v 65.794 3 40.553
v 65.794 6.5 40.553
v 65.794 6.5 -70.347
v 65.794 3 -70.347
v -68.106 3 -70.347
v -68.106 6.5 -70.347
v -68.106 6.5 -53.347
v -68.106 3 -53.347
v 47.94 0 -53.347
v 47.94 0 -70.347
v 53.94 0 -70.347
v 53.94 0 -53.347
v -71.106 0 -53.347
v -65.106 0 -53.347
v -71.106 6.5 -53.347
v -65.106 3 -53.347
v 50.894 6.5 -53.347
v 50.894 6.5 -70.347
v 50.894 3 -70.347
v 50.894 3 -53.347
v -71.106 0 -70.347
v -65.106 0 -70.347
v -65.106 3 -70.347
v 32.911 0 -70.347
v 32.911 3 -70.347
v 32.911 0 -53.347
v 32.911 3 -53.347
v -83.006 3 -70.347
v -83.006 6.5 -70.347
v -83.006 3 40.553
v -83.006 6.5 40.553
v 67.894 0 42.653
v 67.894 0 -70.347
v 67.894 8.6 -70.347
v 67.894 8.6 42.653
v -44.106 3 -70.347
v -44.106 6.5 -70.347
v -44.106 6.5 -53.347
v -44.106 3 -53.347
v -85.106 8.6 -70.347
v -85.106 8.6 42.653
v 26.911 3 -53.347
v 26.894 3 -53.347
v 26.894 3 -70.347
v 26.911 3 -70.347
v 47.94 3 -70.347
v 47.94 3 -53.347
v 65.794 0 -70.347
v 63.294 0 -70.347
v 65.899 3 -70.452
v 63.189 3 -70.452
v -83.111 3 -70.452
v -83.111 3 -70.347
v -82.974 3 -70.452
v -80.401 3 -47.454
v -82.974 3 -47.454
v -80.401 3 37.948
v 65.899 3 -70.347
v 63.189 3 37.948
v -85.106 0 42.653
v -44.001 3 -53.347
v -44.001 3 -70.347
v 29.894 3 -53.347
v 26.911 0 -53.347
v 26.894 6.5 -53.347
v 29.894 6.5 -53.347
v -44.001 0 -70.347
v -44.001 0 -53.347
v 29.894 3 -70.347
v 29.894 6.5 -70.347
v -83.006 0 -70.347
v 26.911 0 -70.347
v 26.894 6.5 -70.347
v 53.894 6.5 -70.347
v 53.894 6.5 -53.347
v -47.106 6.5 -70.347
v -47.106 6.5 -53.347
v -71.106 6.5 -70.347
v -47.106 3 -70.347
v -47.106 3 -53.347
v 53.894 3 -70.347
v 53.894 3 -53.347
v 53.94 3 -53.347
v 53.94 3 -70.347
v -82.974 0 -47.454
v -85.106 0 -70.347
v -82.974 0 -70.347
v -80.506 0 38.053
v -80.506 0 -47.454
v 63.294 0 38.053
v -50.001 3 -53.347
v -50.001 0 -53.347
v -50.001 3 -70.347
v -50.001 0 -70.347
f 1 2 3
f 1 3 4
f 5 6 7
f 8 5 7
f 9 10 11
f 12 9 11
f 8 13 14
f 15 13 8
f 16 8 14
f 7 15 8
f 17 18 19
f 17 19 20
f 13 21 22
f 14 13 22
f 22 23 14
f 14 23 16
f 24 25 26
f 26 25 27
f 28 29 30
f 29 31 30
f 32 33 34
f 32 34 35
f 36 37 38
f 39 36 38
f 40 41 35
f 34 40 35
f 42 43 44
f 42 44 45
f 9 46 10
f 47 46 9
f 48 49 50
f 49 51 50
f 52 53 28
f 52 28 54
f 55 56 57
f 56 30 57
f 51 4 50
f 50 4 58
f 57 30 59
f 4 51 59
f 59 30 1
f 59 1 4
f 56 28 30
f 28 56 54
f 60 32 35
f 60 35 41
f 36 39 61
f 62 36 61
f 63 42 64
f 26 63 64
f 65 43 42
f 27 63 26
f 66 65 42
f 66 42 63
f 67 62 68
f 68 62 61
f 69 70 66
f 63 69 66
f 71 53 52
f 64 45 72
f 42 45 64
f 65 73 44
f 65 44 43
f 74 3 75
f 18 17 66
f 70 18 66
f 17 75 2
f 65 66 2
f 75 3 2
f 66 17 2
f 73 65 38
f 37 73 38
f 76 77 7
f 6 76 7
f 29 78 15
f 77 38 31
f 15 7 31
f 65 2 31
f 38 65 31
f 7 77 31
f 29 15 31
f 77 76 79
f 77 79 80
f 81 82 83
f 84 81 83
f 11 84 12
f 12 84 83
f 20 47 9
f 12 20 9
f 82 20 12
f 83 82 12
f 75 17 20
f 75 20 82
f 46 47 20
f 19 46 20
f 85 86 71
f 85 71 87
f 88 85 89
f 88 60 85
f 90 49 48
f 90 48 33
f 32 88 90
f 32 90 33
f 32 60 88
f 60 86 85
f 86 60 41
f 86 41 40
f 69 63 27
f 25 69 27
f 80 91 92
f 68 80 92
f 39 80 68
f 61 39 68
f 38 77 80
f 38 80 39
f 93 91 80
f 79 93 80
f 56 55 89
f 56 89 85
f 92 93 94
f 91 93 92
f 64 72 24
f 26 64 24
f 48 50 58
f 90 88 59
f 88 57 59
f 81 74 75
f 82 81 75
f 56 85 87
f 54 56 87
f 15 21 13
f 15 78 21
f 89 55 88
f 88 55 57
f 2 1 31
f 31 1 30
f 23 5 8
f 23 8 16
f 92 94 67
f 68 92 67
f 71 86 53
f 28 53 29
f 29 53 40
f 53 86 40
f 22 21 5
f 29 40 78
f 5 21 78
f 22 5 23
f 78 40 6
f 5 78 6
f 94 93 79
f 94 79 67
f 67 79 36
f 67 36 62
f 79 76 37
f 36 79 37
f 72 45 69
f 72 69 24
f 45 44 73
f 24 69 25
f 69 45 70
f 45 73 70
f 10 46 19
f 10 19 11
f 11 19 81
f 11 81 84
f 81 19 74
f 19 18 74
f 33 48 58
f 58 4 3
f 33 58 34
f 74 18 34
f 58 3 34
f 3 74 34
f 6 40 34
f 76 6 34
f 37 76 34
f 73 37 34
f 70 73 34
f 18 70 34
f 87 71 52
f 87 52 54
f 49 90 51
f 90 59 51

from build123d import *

# Parameters (mm, degrees)
F1_DEPTH  = 8.6
F2_T      = -2.1
F3_DEPTH  = 25
F4_W      = 2.5
F4_H      = 108.4
F5_DEPTH  = 3
F5_TAPER  = -2
F6_W      = 3
F6_H      = 17
F7_DEPTH  = 3.5
F8_W      = 6
F8_H      = 17
F9_DEPTH  = 3
F10_W     = 2.4673982024
F10_H     = 22.8933023606
F11_DEPTH = 4


with BuildPart() as f1:
    # F0 (on Front) → F1 (new body)
    with BuildSketch(Plane.XZ):
        Polygon((0, 42.6528545822), (-85.1061937809, 42.6528545822), (-85.1061937809, -70.3471454178), (-68.1061937809, -70.3471454178), (-65.1061937809, -70.3471454178), (-44.1061937809, -70.3471454178), (-41.1061937809, -70.3471454178), (0, -70.3471454178), align=None)
        Polygon((67.8938062191, 42.6528545822), (0, 42.6528545822), (0, -70.3471454178), (23.8938062191, -70.3471454178), (26.8938062191, -70.3471454178), (47.8938062191, -70.3471454178), (50.8938062191, -70.3471454178), (67.8938062191, -70.3471454178), align=None)
    extrude(amount=-F1_DEPTH)

    # F2
    f2_openings = [f1.faces().sort_by_distance(p)[0] for p in [
        (-8.606194, 0, -13.847145),
    ]]
    offset(amount=F2_T, openings=f2_openings)

    # F3 (cut): a face of the model
    f3_faces = [f1.faces().sort_by_distance(p)[0] for p in [
        (-8.6061937809, 3.25, -68.2471454178),
    ]]
    extrude(f3_faces, amount=-F3_DEPTH, mode=Mode.SUBTRACT)

    # F4 (on face) → F5 (join)
    with BuildSketch(Plane.XZ):
        Polygon((-80.5061937809, 40.5528545822), (-80.5061937809, 38.0528545822), (63.2938062191, 38.0528545822), (65.7938062191, 38.0528545822), (65.7938062191, 40.5528545822), align=None)
        Polygon((-83.0061937809, 40.5528545822), (-83.0061937809, -70.3471454178), (-80.5061937809, -70.3471454178), (-80.5061937809, 38.0528545822), (-80.5061937809, 40.5528545822), align=None)
        with Locations((64.5438062191, -16.1471454178)):
            Rectangle(F4_W, F4_H)
    extrude(amount=-F5_DEPTH, taper=F5_TAPER)

    # F6 (on face) → F7 (join)
    with BuildSketch(Plane.XZ.offset(-6.5)):
        with Locations((-69.6061937809, -61.8471454178)):
            Rectangle(F6_W, F6_H)
        with Locations((-45.6061937809, -61.8471454178)):
            Rectangle(F6_W, F6_H)
        with Locations((28.3938062191, -61.8471454178)):
            Rectangle(F6_W, F6_H)
        with Locations((52.3938062191, -61.8471454178)):
            Rectangle(F6_W, F6_H)
    extrude(amount=F7_DEPTH)

    # F8 (on face) → F9 (join)
    with BuildSketch(Plane.XZ.offset(-3)):
        with Locations((-68.1061937809, -61.8471454178)):
            Rectangle(F8_W, F8_H)
        with Locations((-47.0006712973, -61.8471454178)):
            Rectangle(F8_W, F8_H)
        with Locations((29.9112996757, -61.8471454178)):
            Rectangle(F8_W, F8_H)
        with Locations((50.9397262037, -61.8471454178)):
            Rectangle(F8_W, F8_H)
    extrude(amount=F9_DEPTH)

    # F10 (on face) → F11 (cut)
    with BuildSketch(Plane.XZ):
        with Locations((-81.7398928821, -58.9004942375)):
            Rectangle(F10_W, F10_H)
        Polygon((-82.9735919833, -73.1144845486), (-78.0577212572, -73.1144845486), (-78.0577212572, -47.4538430572), (-80.5061937809, -47.4538430572), (-80.5061937809, -70.3471454178), (-82.9735919833, -70.3471454178), align=None)
    extrude(amount=-F11_DEPTH, mode=Mode.SUBTRACT)


solid = f1.part
